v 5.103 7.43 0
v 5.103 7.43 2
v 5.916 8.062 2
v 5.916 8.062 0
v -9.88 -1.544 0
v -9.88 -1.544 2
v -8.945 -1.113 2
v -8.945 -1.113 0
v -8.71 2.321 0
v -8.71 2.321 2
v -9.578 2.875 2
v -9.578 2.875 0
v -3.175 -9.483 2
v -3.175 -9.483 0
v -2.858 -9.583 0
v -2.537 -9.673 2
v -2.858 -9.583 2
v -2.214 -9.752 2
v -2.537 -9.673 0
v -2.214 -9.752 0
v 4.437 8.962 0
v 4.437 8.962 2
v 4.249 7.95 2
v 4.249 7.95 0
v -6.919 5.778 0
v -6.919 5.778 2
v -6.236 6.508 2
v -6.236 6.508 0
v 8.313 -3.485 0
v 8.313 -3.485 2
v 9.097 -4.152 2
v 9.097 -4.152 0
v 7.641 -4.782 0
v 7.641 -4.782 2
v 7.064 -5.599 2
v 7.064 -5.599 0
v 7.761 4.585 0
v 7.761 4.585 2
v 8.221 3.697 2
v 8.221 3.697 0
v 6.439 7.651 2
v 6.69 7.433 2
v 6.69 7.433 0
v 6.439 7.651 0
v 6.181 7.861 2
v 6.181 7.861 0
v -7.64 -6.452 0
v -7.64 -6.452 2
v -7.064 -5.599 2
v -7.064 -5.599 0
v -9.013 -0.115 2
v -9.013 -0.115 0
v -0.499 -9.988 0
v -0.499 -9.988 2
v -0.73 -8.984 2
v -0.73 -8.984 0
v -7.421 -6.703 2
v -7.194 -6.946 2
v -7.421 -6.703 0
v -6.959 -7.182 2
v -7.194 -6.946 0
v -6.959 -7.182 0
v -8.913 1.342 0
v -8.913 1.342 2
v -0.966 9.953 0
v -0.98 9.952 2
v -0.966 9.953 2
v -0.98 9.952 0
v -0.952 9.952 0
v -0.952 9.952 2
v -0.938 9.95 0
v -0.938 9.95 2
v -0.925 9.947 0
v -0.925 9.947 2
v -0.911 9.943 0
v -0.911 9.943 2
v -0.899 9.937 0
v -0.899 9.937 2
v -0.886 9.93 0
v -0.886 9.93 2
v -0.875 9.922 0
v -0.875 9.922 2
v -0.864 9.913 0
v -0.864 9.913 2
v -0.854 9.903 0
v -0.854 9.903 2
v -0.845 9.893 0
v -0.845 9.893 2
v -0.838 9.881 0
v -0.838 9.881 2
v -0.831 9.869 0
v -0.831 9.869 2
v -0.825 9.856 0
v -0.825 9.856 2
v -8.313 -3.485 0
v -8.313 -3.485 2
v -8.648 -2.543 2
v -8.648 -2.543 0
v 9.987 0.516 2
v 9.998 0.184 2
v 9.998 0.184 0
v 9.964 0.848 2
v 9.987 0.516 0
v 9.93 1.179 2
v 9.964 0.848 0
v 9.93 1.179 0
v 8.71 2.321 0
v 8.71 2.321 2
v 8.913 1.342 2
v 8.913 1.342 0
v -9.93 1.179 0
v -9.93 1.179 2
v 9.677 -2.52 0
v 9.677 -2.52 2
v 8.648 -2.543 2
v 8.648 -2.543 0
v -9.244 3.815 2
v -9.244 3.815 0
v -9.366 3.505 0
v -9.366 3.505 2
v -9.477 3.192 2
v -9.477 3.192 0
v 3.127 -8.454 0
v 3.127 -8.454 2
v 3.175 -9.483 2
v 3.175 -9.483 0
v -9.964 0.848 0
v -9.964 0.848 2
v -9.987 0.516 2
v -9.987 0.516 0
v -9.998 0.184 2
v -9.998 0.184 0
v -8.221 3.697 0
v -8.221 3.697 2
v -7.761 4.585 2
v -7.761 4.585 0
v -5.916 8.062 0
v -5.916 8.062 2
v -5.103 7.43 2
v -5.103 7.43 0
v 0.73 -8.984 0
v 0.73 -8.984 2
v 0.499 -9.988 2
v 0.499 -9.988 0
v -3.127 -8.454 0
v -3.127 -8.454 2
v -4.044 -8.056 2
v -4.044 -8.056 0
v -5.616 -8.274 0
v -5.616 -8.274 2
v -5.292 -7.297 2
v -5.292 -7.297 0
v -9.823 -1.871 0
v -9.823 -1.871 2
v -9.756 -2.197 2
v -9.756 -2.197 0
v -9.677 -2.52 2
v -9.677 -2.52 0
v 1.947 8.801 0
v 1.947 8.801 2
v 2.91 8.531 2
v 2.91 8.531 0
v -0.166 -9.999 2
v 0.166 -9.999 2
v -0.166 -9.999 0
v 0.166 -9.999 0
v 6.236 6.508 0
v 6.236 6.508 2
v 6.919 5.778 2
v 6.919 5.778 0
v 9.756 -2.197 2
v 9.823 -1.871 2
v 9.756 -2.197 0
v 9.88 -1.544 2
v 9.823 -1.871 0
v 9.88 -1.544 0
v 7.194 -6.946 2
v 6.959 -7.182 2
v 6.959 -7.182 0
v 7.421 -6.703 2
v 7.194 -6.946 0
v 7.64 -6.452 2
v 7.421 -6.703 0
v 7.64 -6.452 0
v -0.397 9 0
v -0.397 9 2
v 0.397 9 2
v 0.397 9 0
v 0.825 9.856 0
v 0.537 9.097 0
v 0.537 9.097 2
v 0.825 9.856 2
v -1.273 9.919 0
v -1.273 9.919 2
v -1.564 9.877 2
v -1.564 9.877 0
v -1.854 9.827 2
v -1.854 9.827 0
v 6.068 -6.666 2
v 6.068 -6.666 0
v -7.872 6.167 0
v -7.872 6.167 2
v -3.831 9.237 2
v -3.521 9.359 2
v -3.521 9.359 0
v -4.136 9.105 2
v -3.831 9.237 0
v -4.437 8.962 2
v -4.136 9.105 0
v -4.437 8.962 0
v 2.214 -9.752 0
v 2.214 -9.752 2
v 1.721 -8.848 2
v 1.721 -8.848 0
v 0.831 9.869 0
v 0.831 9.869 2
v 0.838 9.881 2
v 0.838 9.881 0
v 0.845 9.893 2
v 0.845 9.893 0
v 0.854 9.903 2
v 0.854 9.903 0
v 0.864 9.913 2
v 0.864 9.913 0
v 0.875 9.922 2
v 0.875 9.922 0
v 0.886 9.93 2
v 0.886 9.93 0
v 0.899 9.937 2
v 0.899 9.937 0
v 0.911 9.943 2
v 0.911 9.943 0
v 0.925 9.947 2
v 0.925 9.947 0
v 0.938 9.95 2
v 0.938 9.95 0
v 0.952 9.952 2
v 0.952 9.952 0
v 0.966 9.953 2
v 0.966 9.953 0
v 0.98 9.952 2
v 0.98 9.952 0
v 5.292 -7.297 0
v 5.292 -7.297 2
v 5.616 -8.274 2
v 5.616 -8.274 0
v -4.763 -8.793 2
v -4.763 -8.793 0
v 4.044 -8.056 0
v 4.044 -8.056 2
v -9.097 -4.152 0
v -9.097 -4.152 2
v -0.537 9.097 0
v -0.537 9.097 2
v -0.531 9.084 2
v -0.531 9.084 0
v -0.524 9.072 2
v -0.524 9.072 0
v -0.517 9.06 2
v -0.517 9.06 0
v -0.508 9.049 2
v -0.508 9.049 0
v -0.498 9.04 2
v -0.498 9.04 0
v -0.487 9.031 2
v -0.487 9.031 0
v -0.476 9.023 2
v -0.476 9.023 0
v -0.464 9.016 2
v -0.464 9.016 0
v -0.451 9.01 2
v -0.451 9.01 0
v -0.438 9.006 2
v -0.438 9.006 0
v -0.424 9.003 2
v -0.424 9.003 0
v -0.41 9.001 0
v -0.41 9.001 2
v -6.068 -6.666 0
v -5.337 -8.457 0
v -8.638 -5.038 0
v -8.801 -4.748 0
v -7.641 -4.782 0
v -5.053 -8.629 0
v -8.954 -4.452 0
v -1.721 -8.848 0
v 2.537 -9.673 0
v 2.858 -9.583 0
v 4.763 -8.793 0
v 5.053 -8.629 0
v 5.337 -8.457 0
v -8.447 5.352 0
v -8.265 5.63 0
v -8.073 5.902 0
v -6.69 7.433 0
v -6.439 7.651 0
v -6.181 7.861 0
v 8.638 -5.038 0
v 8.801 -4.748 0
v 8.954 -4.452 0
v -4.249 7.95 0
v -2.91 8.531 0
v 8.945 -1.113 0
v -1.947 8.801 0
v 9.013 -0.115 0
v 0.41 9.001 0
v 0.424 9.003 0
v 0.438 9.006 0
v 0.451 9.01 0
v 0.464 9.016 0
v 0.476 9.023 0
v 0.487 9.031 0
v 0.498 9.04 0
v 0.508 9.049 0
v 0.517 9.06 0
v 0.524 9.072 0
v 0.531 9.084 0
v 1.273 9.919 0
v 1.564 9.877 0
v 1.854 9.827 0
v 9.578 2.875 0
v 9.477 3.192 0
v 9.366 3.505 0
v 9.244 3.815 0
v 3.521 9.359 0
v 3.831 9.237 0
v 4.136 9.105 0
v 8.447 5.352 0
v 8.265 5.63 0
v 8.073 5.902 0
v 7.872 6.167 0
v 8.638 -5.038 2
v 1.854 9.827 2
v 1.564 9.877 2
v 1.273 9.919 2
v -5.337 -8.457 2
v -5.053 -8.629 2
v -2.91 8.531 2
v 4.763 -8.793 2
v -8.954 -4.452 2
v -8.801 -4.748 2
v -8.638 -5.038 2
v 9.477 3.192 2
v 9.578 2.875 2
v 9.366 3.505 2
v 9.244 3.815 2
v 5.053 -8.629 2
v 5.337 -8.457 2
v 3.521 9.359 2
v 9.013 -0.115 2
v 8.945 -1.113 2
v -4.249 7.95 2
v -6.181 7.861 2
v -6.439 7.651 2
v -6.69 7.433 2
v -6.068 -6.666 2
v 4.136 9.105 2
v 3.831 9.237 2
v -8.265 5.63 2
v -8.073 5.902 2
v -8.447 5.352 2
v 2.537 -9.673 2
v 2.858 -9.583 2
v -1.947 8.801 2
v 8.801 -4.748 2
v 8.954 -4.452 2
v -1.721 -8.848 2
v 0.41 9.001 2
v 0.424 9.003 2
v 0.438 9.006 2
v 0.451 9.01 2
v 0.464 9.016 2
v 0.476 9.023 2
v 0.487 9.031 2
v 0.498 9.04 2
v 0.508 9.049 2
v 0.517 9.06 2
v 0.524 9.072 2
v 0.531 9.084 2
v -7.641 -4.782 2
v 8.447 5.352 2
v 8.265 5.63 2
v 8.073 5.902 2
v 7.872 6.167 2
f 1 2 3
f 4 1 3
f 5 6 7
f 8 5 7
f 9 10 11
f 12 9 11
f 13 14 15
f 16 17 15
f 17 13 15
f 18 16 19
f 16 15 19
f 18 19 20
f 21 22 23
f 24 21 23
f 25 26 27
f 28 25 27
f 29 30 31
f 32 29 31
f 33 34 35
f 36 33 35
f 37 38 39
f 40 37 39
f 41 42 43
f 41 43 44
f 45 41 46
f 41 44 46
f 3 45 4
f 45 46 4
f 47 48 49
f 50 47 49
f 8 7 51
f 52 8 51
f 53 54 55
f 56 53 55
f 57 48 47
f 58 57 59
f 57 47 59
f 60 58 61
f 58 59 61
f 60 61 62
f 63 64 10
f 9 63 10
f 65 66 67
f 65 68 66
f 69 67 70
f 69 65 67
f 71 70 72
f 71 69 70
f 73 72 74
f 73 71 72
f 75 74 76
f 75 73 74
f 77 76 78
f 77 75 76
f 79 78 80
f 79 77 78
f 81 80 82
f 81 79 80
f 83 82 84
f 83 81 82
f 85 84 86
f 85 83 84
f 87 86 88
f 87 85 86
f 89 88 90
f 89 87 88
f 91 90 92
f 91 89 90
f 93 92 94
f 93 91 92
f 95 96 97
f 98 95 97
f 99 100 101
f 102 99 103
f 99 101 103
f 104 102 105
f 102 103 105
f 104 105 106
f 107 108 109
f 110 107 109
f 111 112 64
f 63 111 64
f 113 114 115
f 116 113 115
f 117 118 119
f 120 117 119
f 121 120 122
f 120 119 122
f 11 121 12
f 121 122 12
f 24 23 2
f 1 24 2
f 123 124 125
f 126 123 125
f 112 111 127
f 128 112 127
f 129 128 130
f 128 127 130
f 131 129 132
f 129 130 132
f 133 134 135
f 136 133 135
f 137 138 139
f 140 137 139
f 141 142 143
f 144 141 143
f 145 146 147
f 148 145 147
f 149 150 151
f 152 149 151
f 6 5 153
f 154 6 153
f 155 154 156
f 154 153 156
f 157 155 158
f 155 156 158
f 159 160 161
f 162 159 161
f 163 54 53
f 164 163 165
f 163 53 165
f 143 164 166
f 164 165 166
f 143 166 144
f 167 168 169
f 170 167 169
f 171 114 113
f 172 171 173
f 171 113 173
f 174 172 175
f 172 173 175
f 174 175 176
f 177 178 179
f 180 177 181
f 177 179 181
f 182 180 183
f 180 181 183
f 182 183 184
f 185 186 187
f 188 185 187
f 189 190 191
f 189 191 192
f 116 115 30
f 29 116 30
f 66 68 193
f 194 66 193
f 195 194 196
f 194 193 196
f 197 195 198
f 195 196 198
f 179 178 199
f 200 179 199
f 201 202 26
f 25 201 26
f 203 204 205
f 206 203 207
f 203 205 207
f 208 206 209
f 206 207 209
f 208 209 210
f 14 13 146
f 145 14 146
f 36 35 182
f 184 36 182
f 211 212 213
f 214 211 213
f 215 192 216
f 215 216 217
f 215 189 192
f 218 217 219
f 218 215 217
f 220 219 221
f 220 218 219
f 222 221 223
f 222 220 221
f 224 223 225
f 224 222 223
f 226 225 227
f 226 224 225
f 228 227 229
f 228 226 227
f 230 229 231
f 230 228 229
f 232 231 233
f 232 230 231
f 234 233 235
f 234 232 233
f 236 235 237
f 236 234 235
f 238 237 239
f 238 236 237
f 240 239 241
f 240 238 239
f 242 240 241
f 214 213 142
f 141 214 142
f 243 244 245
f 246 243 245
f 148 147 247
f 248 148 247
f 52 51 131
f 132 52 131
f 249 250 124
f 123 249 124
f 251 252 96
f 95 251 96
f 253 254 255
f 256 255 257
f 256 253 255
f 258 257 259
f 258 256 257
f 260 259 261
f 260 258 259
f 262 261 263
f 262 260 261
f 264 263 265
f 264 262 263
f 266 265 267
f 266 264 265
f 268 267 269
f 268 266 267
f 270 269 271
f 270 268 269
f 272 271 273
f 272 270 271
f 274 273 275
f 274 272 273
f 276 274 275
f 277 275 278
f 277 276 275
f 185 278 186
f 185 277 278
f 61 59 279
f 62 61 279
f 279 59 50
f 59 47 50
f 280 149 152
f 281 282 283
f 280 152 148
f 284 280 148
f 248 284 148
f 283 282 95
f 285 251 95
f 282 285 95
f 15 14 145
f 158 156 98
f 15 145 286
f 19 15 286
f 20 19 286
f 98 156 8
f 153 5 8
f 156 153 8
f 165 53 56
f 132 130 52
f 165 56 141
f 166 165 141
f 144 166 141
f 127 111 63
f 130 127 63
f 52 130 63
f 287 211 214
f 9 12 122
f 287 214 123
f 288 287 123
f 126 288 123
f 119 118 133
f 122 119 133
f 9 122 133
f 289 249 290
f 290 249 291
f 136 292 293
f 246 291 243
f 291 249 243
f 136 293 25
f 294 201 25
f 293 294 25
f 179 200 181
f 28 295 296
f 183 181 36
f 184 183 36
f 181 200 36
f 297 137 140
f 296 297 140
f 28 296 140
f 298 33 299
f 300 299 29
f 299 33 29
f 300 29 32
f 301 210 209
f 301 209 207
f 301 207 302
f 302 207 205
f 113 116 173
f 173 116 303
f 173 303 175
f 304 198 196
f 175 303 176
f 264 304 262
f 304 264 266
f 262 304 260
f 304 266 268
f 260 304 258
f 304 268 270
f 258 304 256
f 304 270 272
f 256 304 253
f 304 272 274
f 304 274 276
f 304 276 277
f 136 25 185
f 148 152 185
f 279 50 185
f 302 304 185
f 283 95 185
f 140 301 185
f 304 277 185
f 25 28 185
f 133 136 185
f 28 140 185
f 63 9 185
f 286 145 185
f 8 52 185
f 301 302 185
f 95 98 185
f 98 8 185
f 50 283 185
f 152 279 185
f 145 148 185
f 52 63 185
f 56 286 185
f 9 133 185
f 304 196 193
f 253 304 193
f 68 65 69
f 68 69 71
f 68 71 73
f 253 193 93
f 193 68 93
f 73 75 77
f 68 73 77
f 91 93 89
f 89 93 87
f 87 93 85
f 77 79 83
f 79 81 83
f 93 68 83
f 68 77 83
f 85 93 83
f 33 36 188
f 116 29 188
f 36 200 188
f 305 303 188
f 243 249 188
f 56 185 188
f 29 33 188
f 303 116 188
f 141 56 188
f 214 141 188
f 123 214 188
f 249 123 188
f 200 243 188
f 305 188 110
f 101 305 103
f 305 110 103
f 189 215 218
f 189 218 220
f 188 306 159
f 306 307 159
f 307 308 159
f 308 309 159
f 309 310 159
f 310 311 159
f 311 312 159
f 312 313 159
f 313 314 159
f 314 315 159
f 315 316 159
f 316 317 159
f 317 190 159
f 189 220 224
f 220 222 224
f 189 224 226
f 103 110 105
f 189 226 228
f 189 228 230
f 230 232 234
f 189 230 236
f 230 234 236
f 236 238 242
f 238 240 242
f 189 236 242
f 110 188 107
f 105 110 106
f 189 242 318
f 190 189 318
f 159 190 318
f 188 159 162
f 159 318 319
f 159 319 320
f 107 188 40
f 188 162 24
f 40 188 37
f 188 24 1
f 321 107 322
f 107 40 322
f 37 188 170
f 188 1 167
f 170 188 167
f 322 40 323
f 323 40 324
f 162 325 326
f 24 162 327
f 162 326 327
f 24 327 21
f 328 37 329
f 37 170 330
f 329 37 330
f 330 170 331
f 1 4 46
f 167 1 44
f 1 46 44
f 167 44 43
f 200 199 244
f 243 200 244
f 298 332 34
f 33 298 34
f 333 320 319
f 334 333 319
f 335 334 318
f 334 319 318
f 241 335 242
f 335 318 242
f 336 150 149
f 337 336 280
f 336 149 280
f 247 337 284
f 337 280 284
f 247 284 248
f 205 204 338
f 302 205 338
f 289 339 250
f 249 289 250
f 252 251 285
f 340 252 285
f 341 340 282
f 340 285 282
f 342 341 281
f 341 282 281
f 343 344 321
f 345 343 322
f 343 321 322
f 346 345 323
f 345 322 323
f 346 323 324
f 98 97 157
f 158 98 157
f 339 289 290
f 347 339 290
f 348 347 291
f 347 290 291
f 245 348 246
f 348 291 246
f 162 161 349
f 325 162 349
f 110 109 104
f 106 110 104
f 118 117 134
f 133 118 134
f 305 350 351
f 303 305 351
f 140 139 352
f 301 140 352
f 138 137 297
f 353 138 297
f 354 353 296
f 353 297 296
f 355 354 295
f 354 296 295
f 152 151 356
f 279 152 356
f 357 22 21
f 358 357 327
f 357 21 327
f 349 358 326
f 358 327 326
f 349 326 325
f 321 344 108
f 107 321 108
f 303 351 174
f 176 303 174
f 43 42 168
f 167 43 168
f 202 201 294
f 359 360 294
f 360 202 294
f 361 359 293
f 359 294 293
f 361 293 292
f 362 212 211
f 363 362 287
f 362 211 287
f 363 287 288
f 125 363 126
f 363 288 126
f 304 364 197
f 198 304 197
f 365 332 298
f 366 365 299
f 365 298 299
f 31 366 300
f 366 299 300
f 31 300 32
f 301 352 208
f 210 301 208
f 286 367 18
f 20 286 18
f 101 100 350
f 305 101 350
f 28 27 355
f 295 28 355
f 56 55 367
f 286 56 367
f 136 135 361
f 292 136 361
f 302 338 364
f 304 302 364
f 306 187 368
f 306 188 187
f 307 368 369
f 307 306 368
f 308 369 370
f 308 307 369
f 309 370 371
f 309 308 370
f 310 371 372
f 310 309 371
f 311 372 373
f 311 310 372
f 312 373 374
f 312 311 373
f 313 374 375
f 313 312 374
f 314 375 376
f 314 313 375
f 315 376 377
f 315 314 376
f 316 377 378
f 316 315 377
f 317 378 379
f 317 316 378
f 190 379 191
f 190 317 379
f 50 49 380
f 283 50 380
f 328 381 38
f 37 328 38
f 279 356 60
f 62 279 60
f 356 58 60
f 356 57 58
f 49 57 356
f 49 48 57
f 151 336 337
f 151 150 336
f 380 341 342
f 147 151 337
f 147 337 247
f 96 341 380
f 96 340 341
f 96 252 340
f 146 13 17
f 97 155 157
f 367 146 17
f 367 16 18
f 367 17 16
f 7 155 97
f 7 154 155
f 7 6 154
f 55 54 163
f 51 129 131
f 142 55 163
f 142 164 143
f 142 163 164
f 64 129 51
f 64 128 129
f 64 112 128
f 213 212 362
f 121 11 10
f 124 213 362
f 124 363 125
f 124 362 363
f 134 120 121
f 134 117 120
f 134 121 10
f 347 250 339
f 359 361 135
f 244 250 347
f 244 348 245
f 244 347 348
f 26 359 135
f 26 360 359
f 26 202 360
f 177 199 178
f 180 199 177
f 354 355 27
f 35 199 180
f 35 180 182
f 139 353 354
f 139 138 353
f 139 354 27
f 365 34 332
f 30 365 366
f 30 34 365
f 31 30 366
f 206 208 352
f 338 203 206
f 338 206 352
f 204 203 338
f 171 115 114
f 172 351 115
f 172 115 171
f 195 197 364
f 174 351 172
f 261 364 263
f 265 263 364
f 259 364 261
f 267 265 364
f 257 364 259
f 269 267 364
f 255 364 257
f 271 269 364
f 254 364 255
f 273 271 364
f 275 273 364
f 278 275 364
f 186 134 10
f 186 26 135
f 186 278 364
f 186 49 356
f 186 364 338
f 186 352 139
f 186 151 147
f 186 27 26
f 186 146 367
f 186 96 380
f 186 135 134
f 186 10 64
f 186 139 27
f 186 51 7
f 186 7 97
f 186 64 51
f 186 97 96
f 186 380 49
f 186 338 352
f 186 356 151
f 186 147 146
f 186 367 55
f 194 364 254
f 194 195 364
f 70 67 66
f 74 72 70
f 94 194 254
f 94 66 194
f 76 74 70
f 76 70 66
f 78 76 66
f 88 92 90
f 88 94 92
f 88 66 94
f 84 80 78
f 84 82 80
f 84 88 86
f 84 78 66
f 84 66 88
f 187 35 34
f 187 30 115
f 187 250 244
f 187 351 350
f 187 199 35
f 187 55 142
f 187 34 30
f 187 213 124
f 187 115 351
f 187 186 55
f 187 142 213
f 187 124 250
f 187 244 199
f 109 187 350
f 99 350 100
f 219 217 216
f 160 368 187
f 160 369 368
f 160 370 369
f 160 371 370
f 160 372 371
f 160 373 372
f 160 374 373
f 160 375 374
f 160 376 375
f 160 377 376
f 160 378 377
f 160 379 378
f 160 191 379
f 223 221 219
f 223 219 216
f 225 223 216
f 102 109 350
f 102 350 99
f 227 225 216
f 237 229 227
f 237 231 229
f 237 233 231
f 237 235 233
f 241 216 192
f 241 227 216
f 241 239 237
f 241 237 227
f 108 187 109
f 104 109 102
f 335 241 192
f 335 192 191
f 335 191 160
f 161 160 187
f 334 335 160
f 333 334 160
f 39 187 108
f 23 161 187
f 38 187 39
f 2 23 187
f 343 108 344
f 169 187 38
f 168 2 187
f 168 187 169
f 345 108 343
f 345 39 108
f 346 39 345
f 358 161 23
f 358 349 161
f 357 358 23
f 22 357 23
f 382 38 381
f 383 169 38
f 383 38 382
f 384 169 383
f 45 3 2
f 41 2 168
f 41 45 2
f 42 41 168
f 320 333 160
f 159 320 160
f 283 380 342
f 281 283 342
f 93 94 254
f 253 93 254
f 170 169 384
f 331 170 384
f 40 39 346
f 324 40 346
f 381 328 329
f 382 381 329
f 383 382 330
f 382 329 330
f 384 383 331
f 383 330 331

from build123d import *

# Parameters (mm, degrees)
F0_R     = 10
F1_DEPTH = 2
F3_DEPTH = 25
F4_COUNT = 23
F5_R     = 0.15


with BuildPart() as f1:
    # F0 (on Top) → F1 (new body)
    with BuildSketch(Plane.XY):
        Circle(F0_R)
    extrude(amount=F1_DEPTH)

    # F2 (on face) → F3 (cut)
    with BuildSketch(Plane.XY.offset(2)):
        with BuildLine():
            Line((0, 10), (0, 9))
            Line((0, 9), (0.5, 9))
            Line((0.5, 9), (0.8657328431, 9.9624548503))
            ThreePointArc((0.8657328431, 9.9624548503), (0.4332732954, 9.9906093033), (0, 10))
        make_face()
        with BuildLine():
            Line((-0.5, 9), (0, 9))
            Line((0, 9), (0, 10))
            ThreePointArc((0, 10), (-0.4332732954, 9.9906093033), (-0.8657328431, 9.9624548503))
            Line((-0.8657328431, 9.9624548503), (-0.5, 9))
        make_face()
    f3 = extrude(amount=-F3_DEPTH, mode=Mode.SUBTRACT)

    # F4: F3 ×23 about axis
    f4_axis = Axis((0, 0, 0), (0, 0, -1))
    for i in range(1, F4_COUNT):
        add(f3.rotate(f4_axis, i * 360 / F4_COUNT), mode=Mode.SUBTRACT)

    # F5
    f5_edges = [f1.edges().sort_by_distance(p)[0] for p in [
        (0.5, 9, 1),
        (-0.5, 9, 1),
        (0.865733, 9.962455, 1),
        (-0.865733, 9.962455, 1),
    ]]
    fillet(f5_edges, radius=F5_R)


solid = f1.part
